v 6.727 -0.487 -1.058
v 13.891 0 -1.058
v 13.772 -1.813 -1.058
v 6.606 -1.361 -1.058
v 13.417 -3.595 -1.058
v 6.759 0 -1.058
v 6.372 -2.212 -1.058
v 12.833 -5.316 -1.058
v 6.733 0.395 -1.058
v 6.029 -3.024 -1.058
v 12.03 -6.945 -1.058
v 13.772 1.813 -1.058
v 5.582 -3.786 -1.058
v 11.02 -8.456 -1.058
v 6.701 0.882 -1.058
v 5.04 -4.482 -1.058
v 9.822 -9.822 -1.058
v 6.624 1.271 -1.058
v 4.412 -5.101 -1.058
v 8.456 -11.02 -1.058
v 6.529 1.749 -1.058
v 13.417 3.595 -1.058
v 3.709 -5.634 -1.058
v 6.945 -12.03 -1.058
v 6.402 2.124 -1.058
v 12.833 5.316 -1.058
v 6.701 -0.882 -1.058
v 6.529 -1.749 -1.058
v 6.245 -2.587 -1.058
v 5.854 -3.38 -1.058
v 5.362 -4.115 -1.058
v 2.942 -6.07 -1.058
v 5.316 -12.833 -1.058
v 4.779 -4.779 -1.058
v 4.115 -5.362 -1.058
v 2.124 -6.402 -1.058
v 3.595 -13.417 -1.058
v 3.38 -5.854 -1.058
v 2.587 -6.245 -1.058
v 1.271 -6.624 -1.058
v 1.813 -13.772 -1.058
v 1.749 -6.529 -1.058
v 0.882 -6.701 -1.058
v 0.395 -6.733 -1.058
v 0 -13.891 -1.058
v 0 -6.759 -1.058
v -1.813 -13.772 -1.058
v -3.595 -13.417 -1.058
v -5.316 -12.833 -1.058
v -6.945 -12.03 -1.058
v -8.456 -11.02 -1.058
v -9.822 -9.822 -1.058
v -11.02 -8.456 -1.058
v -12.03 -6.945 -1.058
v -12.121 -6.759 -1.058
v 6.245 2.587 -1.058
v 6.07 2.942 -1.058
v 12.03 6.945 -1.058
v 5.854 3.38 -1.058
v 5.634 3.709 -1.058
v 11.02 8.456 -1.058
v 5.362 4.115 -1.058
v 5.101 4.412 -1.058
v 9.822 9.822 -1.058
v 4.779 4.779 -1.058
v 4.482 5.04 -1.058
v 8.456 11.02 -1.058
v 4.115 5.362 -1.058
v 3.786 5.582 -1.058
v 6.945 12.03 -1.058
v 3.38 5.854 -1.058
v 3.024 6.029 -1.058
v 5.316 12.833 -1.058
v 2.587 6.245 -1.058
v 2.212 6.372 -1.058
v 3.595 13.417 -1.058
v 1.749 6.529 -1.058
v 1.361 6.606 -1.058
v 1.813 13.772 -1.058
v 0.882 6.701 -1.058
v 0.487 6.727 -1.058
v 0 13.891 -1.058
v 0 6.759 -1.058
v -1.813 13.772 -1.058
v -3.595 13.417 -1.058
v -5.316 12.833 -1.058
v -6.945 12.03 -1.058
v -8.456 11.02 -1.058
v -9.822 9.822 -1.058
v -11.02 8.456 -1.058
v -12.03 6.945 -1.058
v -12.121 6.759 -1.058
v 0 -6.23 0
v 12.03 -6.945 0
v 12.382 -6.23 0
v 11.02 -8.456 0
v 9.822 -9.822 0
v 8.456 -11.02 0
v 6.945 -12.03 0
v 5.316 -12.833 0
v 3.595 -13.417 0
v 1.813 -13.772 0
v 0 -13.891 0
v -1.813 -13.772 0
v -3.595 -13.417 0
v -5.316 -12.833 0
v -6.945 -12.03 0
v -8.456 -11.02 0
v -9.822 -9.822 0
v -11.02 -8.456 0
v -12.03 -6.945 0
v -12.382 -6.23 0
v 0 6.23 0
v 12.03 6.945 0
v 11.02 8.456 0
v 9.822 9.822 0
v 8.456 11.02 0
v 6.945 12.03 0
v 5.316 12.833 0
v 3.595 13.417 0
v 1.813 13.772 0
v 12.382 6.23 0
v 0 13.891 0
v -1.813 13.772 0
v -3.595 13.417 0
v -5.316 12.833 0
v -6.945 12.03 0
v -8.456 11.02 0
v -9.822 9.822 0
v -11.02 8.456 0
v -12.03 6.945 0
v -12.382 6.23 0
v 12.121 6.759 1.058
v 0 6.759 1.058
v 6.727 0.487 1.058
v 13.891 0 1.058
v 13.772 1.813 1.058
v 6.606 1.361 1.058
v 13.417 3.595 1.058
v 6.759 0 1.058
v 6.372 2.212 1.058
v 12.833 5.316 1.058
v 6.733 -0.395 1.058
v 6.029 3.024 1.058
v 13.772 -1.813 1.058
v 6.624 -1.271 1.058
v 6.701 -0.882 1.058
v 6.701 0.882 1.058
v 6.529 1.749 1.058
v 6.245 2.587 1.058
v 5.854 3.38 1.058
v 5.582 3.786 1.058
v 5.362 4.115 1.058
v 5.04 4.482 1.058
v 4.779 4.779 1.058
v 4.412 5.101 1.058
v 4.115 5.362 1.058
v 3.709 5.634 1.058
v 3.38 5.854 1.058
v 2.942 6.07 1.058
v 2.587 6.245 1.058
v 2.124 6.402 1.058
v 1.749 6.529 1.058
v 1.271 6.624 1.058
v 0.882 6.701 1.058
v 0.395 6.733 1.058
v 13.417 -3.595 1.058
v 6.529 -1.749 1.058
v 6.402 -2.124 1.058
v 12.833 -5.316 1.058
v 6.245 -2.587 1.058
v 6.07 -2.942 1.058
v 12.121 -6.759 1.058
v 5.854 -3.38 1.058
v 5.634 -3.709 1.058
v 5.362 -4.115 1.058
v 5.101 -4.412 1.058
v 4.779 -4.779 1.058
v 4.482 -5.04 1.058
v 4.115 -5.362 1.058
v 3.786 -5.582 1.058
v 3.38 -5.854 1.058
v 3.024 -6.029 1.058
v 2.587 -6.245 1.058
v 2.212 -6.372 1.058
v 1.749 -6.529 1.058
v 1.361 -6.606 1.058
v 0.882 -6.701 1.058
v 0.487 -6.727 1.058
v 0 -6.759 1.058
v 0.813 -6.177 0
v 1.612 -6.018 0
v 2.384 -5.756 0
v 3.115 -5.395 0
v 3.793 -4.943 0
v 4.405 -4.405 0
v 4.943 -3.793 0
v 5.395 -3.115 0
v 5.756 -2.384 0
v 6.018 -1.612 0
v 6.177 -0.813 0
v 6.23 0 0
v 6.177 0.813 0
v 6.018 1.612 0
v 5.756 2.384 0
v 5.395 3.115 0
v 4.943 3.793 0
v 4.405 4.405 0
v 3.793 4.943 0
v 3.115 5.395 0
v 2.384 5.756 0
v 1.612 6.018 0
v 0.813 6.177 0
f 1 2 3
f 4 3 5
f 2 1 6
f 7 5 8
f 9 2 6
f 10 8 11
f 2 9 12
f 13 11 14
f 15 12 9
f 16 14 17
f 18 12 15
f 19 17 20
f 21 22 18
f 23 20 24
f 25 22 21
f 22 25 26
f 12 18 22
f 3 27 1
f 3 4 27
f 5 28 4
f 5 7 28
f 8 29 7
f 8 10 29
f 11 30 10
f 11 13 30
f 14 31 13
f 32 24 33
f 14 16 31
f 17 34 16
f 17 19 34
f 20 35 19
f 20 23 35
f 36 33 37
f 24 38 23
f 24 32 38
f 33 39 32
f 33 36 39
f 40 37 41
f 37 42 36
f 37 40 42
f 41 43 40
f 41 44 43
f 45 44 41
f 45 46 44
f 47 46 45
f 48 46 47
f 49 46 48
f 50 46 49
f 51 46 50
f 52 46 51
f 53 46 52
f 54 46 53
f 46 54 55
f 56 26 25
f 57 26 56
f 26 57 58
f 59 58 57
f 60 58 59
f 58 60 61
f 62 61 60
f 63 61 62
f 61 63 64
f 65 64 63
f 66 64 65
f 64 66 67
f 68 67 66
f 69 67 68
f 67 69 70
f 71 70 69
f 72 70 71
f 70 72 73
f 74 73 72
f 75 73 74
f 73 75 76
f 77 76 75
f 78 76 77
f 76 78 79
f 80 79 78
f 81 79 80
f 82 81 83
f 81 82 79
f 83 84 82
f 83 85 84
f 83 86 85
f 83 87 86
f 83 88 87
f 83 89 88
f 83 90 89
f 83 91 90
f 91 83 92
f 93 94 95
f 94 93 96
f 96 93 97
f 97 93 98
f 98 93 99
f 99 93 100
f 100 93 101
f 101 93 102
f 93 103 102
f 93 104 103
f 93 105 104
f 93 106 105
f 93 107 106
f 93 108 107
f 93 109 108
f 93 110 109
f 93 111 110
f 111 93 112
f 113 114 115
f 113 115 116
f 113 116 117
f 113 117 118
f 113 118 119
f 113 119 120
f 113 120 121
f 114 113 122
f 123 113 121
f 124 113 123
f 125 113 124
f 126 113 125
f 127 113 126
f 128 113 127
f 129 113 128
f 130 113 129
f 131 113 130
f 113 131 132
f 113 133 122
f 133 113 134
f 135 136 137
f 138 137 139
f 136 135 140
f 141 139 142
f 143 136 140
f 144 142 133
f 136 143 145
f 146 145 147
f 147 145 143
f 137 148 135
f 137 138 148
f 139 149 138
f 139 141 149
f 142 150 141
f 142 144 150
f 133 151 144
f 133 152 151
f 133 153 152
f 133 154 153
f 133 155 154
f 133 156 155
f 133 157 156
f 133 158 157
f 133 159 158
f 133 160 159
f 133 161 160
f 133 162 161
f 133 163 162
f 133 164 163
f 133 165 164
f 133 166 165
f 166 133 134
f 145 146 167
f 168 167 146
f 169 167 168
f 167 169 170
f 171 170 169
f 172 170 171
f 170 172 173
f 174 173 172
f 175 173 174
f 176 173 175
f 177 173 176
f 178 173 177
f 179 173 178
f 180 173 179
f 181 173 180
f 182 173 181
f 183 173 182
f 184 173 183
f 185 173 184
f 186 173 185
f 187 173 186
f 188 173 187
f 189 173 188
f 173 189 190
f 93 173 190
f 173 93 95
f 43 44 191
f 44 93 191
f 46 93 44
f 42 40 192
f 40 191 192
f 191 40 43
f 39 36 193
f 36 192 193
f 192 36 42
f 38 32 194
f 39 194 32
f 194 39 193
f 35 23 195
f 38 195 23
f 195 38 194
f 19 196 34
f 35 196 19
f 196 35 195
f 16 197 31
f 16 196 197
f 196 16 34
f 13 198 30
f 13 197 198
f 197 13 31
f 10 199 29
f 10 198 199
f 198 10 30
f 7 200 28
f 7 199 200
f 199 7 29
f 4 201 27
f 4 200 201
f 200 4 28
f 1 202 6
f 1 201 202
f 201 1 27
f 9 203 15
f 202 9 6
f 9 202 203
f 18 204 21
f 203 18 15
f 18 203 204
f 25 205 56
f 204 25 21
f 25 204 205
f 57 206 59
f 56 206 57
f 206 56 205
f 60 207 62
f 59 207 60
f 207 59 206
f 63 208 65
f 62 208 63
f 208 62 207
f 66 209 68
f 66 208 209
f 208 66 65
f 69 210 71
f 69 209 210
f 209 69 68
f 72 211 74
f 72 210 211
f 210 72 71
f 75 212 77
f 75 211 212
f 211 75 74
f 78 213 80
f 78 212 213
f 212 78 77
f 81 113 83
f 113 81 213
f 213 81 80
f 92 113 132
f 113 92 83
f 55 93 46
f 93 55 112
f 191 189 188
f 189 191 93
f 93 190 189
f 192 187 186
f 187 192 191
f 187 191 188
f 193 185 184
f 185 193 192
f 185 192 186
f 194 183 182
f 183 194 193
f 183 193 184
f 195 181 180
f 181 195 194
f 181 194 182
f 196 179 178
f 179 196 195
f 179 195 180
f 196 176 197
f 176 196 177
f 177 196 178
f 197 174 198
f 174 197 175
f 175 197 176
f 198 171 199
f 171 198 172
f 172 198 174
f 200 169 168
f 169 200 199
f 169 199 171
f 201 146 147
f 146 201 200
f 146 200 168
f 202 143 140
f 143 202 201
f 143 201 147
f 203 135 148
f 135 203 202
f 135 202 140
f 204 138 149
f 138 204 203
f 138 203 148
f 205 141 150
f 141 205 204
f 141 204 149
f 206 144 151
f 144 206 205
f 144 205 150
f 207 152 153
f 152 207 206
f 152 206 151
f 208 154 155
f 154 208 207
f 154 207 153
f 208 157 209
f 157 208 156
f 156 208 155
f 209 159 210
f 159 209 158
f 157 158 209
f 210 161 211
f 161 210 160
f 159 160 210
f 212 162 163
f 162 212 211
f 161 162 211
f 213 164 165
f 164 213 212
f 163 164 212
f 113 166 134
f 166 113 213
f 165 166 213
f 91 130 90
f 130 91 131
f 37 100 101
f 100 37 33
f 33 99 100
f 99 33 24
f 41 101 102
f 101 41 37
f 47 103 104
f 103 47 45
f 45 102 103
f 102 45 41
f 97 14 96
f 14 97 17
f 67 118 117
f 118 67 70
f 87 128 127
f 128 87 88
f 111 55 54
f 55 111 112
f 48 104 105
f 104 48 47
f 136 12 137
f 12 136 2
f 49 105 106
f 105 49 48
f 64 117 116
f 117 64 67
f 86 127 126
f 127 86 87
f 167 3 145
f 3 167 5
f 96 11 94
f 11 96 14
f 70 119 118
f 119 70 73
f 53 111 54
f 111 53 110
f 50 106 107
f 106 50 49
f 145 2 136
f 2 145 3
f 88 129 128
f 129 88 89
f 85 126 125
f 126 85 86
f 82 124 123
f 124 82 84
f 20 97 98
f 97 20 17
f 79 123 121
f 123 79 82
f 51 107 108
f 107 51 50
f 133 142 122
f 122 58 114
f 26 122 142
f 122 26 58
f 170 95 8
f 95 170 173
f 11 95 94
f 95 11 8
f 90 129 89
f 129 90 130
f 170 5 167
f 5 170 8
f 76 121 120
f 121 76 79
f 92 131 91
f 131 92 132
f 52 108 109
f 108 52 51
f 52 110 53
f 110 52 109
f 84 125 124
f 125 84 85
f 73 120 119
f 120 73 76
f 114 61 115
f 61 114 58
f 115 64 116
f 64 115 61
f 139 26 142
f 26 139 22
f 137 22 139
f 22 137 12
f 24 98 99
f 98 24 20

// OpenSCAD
// TwoPartPortLid0.1
// 
// Idea: Something that fits onto the end of a hollow screw (e.g. p1689)
// to hold a smaller cord or port of some sort (e.g. a GX12 port),
// in two parts, so that it can be removed.
// This two-part 'lid' would be attached with a separate 'ring',
// similar to a mason jar lid.

outer_diameter    = "1+3/32inch";
hole_diameter     = "1/2inch";
total_thickness   = "1/12inch";
slot_bevel        =  0.5; // 0.01
slot_bevel_offset = "-0.12mm"; 
$fn = 48;

use <../lib/TOGUnits1.scad>
use <../lib/TOGMod1.scad>
use <../lib/TOGMod1Constructors.scad>
use <../lib/TOGPath1.scad>
use <../lib/TOGPolyhedronLib1.scad>
use <../lib/TOGVecLib0.scad>

total_thickness_mm = togunits1_to_mm(total_thickness);
half_thickness_mm  = total_thickness_mm/2;
outer_diameter_mm  = togunits1_to_mm(outer_diameter);
hole_diameter_mm   = togunits1_to_mm(hole_diameter);
slot_bevel_offset_mm = togunits1_to_mm(slot_bevel_offset);



togmod1_domodule(["intersection",
	togmod1_linear_extrude_z([-half_thickness_mm-100, half_thickness_mm+100], togmod1_make_circle(d=outer_diameter_mm)),
	
	["difference",
		["union",
			togmod1_linear_extrude_z([-half_thickness_mm, 0], togmod1_make_rect([outer_diameter_mm*2, outer_diameter_mm*2])),
			togmod1_linear_extrude_x([0, outer_diameter_mm+1], togmod1_make_polygon([
				[ hole_diameter_mm/2 - half_thickness_mm*slot_bevel + slot_bevel_offset_mm, -half_thickness_mm],
				[ hole_diameter_mm/2 + half_thickness_mm*slot_bevel + slot_bevel_offset_mm, +half_thickness_mm],
				[-hole_diameter_mm/2 - half_thickness_mm*slot_bevel - slot_bevel_offset_mm, +half_thickness_mm],
				[-hole_diameter_mm/2 + half_thickness_mm*slot_bevel - slot_bevel_offset_mm, -half_thickness_mm],
			])),
		],
		
		tphl1_make_polyhedron_from_layer_function([
			[-half_thickness_mm - 1, hole_diameter_mm/2 + (half_thickness_mm+1)*slot_bevel + slot_bevel_offset_mm],
			[                 0    , hole_diameter_mm/2                                    + slot_bevel_offset_mm],
			[ half_thickness_mm + 1, hole_diameter_mm/2 + (half_thickness_mm+1)*slot_bevel + slot_bevel_offset_mm],
		], function(zr) togvec0_offset_points(
			togpath1_qath_to_polypoints(["togpath1-qath",
				["togpath1-qathseg", [    0,0], -90,  90, zr[1]],
				["togpath1-qathseg", [-1000,0],  90, -90, zr[1]],
			]),
			zr[0]
		)),
	],
]);
